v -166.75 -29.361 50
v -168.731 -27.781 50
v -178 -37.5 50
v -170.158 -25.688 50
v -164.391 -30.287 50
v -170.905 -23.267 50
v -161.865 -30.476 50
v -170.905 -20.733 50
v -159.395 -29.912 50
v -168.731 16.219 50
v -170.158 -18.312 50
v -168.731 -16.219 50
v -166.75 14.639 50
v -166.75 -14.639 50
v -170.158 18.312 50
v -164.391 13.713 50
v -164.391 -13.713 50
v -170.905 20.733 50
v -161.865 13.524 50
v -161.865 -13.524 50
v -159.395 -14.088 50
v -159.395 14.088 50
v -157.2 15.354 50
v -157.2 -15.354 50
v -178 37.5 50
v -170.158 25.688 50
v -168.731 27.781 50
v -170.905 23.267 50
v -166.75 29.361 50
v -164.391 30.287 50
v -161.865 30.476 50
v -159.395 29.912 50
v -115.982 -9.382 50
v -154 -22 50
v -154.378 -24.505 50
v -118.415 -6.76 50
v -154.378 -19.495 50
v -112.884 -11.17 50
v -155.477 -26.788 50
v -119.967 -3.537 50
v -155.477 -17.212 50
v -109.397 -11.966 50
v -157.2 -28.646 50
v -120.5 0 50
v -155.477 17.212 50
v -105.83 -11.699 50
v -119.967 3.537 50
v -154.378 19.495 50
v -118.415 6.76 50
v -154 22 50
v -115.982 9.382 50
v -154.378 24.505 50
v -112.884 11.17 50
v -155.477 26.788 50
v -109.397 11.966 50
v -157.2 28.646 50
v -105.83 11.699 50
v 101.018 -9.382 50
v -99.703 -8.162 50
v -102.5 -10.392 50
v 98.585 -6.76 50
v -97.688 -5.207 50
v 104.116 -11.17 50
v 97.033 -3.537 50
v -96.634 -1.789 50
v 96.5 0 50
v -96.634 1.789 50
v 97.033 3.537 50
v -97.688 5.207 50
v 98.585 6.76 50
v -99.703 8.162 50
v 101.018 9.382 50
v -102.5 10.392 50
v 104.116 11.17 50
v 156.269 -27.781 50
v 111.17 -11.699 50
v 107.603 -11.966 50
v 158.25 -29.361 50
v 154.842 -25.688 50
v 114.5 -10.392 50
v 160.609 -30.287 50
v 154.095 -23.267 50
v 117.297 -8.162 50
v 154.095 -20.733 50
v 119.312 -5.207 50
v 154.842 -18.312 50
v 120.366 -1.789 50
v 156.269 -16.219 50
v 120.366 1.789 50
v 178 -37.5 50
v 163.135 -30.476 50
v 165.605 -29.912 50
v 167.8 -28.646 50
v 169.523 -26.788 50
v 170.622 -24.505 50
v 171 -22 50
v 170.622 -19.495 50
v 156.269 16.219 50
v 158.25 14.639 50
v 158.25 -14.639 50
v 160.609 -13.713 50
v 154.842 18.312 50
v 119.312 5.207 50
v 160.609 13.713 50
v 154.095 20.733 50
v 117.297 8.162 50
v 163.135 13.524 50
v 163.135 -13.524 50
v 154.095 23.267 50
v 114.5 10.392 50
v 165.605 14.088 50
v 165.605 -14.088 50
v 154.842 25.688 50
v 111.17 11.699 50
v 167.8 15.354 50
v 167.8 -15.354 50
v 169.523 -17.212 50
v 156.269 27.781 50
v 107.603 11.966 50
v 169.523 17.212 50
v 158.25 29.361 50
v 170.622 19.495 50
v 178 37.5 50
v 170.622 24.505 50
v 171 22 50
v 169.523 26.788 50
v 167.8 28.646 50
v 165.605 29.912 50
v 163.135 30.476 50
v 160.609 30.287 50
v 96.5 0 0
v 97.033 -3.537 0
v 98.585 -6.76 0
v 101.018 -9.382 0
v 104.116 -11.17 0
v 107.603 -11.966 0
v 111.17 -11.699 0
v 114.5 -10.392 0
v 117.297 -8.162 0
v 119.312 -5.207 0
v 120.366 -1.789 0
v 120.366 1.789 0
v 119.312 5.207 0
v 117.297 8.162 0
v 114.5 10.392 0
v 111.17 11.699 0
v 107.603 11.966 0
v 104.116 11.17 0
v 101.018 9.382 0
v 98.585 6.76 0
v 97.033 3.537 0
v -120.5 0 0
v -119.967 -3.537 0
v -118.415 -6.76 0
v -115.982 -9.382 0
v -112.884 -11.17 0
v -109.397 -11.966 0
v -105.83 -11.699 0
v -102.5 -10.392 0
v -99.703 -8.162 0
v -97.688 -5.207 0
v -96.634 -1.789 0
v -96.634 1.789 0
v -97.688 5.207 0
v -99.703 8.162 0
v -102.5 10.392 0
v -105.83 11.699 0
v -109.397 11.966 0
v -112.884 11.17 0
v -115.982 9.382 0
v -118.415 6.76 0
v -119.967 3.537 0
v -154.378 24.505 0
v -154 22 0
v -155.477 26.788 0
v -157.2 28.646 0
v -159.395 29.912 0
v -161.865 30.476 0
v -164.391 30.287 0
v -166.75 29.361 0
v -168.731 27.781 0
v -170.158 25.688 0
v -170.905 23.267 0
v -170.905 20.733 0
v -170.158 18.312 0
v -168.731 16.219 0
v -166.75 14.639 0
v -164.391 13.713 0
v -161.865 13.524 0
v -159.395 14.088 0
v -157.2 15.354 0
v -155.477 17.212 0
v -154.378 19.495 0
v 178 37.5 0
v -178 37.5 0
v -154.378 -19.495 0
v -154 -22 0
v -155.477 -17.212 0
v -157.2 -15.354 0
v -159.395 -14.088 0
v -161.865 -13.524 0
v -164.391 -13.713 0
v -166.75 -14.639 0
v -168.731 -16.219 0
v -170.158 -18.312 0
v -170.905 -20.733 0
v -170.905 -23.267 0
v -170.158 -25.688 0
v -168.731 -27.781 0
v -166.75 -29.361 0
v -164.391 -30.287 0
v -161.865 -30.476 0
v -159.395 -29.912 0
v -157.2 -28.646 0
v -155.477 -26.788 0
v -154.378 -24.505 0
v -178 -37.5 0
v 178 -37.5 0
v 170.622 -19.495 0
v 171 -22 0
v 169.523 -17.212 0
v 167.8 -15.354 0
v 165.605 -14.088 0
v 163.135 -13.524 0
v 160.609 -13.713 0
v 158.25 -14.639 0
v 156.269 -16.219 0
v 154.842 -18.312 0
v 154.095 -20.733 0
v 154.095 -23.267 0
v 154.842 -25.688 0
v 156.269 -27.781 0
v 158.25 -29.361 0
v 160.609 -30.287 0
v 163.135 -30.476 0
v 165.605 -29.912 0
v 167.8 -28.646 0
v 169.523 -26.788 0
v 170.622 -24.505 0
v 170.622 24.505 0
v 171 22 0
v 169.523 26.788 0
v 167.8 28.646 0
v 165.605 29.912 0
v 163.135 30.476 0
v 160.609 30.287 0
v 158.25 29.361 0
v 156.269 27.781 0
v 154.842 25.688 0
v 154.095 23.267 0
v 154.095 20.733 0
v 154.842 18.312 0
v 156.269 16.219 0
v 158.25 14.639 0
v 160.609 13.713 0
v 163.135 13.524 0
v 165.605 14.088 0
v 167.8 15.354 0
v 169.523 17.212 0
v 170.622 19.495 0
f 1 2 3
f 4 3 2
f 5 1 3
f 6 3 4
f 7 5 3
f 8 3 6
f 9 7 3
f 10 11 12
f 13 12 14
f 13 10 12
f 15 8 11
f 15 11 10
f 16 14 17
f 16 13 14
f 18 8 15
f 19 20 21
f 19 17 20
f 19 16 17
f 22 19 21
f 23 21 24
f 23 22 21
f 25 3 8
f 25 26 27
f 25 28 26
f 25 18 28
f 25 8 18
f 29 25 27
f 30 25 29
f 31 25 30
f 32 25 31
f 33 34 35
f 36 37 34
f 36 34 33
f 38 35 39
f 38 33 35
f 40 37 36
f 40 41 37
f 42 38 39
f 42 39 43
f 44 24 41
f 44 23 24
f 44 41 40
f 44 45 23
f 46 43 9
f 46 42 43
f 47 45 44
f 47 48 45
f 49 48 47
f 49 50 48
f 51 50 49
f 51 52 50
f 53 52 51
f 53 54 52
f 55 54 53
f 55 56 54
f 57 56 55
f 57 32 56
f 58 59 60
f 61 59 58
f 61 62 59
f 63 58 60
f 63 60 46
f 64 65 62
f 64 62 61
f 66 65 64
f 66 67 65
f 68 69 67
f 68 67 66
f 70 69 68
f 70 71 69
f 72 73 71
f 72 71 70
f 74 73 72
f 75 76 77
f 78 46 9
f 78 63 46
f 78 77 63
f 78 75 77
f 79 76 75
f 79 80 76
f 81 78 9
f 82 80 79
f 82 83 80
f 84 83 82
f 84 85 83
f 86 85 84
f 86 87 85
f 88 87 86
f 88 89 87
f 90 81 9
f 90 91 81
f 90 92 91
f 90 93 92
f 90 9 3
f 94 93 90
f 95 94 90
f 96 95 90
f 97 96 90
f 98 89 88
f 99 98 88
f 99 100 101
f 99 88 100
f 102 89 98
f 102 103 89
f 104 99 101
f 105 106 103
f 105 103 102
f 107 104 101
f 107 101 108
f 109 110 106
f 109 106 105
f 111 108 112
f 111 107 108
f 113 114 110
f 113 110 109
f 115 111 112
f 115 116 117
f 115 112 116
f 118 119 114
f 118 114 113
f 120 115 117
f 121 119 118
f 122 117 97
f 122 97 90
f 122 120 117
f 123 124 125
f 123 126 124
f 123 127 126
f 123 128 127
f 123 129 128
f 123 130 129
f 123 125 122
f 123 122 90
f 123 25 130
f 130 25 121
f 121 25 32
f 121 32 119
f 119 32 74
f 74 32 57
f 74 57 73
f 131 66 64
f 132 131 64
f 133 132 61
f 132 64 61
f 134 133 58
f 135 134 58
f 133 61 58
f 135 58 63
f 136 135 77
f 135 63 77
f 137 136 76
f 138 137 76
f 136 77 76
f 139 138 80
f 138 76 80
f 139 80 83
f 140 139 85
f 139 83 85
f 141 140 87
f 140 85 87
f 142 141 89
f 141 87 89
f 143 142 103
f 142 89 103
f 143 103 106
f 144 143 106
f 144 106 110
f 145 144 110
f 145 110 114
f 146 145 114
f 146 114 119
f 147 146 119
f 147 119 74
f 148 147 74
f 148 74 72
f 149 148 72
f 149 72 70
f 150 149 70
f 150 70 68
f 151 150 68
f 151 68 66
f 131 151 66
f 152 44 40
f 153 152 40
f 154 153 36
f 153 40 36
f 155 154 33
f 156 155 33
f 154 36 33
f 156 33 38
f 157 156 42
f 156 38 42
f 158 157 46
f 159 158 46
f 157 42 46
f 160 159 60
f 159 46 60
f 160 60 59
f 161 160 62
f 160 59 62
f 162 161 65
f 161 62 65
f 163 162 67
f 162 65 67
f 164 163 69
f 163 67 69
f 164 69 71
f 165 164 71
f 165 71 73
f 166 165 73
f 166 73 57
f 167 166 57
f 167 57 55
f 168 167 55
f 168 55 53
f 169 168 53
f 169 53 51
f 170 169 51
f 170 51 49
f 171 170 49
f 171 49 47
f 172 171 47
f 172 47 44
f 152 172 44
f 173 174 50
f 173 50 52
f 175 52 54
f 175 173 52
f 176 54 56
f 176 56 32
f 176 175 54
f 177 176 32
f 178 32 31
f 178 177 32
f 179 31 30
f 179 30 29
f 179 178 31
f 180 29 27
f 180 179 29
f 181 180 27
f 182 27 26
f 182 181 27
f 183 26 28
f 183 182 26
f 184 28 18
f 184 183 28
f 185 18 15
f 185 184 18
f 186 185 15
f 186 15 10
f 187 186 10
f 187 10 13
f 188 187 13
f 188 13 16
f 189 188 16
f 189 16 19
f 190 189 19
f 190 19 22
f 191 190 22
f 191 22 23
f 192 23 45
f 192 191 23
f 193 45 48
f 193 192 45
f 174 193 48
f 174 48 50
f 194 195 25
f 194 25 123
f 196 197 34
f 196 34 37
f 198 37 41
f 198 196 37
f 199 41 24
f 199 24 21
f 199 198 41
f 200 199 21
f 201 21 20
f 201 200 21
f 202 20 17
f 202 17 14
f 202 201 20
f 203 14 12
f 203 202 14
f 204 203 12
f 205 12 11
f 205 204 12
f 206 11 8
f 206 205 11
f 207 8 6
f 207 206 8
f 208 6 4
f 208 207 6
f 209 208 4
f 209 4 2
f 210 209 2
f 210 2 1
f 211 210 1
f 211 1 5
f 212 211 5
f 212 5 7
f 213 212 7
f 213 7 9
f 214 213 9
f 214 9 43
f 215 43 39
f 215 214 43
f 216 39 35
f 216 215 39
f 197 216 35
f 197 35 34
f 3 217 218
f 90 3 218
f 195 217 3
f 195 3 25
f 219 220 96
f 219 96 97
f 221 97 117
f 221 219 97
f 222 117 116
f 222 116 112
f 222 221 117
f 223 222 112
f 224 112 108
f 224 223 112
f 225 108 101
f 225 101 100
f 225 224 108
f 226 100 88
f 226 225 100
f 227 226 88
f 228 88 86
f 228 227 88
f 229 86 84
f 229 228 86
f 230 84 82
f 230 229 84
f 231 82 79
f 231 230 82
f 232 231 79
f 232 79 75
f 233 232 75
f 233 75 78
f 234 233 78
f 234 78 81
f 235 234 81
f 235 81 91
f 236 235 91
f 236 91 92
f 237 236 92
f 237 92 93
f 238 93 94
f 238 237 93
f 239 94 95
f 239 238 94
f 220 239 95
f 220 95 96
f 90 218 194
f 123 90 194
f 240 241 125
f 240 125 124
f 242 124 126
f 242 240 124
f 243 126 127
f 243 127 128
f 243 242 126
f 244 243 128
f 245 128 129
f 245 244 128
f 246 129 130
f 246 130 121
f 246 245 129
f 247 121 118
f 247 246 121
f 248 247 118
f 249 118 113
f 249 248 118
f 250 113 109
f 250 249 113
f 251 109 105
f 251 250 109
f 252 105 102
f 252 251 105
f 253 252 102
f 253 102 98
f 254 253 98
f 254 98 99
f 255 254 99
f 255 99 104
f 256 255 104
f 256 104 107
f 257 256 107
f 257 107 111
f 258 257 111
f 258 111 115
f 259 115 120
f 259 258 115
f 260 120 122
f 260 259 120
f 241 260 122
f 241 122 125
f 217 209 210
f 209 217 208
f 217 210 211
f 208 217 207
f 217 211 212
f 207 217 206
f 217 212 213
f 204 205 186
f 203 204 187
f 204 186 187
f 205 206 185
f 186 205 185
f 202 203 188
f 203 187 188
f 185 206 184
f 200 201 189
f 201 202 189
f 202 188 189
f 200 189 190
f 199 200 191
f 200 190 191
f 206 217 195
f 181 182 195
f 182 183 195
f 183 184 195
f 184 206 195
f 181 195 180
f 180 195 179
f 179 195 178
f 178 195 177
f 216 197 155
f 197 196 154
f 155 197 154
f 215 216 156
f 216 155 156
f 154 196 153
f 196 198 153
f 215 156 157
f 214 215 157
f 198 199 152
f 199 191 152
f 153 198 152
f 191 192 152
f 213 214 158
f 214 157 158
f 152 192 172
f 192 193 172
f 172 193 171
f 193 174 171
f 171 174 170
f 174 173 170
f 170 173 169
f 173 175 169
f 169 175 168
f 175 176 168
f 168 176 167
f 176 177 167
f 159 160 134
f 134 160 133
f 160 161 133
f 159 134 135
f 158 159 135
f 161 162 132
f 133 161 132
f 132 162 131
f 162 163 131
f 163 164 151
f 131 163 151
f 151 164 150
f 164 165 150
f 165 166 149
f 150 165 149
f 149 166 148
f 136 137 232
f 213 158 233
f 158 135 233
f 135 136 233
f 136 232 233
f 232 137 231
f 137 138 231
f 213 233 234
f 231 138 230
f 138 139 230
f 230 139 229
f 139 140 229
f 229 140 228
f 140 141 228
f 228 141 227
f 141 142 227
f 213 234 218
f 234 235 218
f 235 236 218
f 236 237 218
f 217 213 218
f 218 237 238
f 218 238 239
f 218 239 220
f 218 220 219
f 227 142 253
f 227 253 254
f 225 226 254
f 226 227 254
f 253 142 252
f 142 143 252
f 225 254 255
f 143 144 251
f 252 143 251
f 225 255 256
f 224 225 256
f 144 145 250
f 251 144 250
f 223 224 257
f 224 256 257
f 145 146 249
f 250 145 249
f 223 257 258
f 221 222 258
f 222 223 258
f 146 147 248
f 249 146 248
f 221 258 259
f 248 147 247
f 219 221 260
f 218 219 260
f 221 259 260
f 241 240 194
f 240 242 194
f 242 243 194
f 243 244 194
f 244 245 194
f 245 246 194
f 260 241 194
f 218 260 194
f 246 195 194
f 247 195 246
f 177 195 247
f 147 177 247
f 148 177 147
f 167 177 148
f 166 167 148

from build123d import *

# Parameters (mm, degrees)
F0_W     = 356
F0_H     = 75
F0_R     = 8.5
F0_R_2   = 12
F0_R_3   = 13
F0_R_4   = 18
F1_DEPTH = 50
F2_D     = 24


with BuildPart() as f1:
    # F0 (on Top) → F1 (new body)
    with BuildSketch(Plane.XY):
        Rectangle(F0_W, F0_H)
        with Locations((-162.5, -22)):
            Circle(F0_R, mode=Mode.SUBTRACT)
        with Locations((162.5, -22)):
            Circle(F0_R_2, mode=Mode.SUBTRACT)
        with Locations((-108.5, 0)):
            Circle(F0_R_3, mode=Mode.SUBTRACT)
        with Locations((-162.5, 22)):
            Circle(F0_R, mode=Mode.SUBTRACT)
        with Locations((108.5, 0)):
            Circle(F0_R_4, mode=Mode.SUBTRACT)
        with Locations((162.5, 22)):
            Circle(F0_R, mode=Mode.SUBTRACT)
        with Locations((162.5, -22)):
            Circle(F0_R_2)
        with Locations((162.5, -22)):
            Circle(F0_R, mode=Mode.SUBTRACT)
        with Locations((108.5, 0)):
            Circle(F0_R_4)
        with Locations((108.5, 0)):
            Circle(F0_R_3, mode=Mode.SUBTRACT)
        with Locations((-108.5, 0)):
            Circle(F0_R_3)
        with Locations((108.5, 0)):
            Circle(F0_R_3)
    extrude(amount=F1_DEPTH)

    # F2 (through all)
    with Locations(Plane(origin=(0, 0, 0), x_dir=(1, 0, 0), z_dir=(0, 0, -1))):
        with Locations((-108.5, 0), (108.5, 0)):
            Hole(F2_D / 2)


solid = f1.part
